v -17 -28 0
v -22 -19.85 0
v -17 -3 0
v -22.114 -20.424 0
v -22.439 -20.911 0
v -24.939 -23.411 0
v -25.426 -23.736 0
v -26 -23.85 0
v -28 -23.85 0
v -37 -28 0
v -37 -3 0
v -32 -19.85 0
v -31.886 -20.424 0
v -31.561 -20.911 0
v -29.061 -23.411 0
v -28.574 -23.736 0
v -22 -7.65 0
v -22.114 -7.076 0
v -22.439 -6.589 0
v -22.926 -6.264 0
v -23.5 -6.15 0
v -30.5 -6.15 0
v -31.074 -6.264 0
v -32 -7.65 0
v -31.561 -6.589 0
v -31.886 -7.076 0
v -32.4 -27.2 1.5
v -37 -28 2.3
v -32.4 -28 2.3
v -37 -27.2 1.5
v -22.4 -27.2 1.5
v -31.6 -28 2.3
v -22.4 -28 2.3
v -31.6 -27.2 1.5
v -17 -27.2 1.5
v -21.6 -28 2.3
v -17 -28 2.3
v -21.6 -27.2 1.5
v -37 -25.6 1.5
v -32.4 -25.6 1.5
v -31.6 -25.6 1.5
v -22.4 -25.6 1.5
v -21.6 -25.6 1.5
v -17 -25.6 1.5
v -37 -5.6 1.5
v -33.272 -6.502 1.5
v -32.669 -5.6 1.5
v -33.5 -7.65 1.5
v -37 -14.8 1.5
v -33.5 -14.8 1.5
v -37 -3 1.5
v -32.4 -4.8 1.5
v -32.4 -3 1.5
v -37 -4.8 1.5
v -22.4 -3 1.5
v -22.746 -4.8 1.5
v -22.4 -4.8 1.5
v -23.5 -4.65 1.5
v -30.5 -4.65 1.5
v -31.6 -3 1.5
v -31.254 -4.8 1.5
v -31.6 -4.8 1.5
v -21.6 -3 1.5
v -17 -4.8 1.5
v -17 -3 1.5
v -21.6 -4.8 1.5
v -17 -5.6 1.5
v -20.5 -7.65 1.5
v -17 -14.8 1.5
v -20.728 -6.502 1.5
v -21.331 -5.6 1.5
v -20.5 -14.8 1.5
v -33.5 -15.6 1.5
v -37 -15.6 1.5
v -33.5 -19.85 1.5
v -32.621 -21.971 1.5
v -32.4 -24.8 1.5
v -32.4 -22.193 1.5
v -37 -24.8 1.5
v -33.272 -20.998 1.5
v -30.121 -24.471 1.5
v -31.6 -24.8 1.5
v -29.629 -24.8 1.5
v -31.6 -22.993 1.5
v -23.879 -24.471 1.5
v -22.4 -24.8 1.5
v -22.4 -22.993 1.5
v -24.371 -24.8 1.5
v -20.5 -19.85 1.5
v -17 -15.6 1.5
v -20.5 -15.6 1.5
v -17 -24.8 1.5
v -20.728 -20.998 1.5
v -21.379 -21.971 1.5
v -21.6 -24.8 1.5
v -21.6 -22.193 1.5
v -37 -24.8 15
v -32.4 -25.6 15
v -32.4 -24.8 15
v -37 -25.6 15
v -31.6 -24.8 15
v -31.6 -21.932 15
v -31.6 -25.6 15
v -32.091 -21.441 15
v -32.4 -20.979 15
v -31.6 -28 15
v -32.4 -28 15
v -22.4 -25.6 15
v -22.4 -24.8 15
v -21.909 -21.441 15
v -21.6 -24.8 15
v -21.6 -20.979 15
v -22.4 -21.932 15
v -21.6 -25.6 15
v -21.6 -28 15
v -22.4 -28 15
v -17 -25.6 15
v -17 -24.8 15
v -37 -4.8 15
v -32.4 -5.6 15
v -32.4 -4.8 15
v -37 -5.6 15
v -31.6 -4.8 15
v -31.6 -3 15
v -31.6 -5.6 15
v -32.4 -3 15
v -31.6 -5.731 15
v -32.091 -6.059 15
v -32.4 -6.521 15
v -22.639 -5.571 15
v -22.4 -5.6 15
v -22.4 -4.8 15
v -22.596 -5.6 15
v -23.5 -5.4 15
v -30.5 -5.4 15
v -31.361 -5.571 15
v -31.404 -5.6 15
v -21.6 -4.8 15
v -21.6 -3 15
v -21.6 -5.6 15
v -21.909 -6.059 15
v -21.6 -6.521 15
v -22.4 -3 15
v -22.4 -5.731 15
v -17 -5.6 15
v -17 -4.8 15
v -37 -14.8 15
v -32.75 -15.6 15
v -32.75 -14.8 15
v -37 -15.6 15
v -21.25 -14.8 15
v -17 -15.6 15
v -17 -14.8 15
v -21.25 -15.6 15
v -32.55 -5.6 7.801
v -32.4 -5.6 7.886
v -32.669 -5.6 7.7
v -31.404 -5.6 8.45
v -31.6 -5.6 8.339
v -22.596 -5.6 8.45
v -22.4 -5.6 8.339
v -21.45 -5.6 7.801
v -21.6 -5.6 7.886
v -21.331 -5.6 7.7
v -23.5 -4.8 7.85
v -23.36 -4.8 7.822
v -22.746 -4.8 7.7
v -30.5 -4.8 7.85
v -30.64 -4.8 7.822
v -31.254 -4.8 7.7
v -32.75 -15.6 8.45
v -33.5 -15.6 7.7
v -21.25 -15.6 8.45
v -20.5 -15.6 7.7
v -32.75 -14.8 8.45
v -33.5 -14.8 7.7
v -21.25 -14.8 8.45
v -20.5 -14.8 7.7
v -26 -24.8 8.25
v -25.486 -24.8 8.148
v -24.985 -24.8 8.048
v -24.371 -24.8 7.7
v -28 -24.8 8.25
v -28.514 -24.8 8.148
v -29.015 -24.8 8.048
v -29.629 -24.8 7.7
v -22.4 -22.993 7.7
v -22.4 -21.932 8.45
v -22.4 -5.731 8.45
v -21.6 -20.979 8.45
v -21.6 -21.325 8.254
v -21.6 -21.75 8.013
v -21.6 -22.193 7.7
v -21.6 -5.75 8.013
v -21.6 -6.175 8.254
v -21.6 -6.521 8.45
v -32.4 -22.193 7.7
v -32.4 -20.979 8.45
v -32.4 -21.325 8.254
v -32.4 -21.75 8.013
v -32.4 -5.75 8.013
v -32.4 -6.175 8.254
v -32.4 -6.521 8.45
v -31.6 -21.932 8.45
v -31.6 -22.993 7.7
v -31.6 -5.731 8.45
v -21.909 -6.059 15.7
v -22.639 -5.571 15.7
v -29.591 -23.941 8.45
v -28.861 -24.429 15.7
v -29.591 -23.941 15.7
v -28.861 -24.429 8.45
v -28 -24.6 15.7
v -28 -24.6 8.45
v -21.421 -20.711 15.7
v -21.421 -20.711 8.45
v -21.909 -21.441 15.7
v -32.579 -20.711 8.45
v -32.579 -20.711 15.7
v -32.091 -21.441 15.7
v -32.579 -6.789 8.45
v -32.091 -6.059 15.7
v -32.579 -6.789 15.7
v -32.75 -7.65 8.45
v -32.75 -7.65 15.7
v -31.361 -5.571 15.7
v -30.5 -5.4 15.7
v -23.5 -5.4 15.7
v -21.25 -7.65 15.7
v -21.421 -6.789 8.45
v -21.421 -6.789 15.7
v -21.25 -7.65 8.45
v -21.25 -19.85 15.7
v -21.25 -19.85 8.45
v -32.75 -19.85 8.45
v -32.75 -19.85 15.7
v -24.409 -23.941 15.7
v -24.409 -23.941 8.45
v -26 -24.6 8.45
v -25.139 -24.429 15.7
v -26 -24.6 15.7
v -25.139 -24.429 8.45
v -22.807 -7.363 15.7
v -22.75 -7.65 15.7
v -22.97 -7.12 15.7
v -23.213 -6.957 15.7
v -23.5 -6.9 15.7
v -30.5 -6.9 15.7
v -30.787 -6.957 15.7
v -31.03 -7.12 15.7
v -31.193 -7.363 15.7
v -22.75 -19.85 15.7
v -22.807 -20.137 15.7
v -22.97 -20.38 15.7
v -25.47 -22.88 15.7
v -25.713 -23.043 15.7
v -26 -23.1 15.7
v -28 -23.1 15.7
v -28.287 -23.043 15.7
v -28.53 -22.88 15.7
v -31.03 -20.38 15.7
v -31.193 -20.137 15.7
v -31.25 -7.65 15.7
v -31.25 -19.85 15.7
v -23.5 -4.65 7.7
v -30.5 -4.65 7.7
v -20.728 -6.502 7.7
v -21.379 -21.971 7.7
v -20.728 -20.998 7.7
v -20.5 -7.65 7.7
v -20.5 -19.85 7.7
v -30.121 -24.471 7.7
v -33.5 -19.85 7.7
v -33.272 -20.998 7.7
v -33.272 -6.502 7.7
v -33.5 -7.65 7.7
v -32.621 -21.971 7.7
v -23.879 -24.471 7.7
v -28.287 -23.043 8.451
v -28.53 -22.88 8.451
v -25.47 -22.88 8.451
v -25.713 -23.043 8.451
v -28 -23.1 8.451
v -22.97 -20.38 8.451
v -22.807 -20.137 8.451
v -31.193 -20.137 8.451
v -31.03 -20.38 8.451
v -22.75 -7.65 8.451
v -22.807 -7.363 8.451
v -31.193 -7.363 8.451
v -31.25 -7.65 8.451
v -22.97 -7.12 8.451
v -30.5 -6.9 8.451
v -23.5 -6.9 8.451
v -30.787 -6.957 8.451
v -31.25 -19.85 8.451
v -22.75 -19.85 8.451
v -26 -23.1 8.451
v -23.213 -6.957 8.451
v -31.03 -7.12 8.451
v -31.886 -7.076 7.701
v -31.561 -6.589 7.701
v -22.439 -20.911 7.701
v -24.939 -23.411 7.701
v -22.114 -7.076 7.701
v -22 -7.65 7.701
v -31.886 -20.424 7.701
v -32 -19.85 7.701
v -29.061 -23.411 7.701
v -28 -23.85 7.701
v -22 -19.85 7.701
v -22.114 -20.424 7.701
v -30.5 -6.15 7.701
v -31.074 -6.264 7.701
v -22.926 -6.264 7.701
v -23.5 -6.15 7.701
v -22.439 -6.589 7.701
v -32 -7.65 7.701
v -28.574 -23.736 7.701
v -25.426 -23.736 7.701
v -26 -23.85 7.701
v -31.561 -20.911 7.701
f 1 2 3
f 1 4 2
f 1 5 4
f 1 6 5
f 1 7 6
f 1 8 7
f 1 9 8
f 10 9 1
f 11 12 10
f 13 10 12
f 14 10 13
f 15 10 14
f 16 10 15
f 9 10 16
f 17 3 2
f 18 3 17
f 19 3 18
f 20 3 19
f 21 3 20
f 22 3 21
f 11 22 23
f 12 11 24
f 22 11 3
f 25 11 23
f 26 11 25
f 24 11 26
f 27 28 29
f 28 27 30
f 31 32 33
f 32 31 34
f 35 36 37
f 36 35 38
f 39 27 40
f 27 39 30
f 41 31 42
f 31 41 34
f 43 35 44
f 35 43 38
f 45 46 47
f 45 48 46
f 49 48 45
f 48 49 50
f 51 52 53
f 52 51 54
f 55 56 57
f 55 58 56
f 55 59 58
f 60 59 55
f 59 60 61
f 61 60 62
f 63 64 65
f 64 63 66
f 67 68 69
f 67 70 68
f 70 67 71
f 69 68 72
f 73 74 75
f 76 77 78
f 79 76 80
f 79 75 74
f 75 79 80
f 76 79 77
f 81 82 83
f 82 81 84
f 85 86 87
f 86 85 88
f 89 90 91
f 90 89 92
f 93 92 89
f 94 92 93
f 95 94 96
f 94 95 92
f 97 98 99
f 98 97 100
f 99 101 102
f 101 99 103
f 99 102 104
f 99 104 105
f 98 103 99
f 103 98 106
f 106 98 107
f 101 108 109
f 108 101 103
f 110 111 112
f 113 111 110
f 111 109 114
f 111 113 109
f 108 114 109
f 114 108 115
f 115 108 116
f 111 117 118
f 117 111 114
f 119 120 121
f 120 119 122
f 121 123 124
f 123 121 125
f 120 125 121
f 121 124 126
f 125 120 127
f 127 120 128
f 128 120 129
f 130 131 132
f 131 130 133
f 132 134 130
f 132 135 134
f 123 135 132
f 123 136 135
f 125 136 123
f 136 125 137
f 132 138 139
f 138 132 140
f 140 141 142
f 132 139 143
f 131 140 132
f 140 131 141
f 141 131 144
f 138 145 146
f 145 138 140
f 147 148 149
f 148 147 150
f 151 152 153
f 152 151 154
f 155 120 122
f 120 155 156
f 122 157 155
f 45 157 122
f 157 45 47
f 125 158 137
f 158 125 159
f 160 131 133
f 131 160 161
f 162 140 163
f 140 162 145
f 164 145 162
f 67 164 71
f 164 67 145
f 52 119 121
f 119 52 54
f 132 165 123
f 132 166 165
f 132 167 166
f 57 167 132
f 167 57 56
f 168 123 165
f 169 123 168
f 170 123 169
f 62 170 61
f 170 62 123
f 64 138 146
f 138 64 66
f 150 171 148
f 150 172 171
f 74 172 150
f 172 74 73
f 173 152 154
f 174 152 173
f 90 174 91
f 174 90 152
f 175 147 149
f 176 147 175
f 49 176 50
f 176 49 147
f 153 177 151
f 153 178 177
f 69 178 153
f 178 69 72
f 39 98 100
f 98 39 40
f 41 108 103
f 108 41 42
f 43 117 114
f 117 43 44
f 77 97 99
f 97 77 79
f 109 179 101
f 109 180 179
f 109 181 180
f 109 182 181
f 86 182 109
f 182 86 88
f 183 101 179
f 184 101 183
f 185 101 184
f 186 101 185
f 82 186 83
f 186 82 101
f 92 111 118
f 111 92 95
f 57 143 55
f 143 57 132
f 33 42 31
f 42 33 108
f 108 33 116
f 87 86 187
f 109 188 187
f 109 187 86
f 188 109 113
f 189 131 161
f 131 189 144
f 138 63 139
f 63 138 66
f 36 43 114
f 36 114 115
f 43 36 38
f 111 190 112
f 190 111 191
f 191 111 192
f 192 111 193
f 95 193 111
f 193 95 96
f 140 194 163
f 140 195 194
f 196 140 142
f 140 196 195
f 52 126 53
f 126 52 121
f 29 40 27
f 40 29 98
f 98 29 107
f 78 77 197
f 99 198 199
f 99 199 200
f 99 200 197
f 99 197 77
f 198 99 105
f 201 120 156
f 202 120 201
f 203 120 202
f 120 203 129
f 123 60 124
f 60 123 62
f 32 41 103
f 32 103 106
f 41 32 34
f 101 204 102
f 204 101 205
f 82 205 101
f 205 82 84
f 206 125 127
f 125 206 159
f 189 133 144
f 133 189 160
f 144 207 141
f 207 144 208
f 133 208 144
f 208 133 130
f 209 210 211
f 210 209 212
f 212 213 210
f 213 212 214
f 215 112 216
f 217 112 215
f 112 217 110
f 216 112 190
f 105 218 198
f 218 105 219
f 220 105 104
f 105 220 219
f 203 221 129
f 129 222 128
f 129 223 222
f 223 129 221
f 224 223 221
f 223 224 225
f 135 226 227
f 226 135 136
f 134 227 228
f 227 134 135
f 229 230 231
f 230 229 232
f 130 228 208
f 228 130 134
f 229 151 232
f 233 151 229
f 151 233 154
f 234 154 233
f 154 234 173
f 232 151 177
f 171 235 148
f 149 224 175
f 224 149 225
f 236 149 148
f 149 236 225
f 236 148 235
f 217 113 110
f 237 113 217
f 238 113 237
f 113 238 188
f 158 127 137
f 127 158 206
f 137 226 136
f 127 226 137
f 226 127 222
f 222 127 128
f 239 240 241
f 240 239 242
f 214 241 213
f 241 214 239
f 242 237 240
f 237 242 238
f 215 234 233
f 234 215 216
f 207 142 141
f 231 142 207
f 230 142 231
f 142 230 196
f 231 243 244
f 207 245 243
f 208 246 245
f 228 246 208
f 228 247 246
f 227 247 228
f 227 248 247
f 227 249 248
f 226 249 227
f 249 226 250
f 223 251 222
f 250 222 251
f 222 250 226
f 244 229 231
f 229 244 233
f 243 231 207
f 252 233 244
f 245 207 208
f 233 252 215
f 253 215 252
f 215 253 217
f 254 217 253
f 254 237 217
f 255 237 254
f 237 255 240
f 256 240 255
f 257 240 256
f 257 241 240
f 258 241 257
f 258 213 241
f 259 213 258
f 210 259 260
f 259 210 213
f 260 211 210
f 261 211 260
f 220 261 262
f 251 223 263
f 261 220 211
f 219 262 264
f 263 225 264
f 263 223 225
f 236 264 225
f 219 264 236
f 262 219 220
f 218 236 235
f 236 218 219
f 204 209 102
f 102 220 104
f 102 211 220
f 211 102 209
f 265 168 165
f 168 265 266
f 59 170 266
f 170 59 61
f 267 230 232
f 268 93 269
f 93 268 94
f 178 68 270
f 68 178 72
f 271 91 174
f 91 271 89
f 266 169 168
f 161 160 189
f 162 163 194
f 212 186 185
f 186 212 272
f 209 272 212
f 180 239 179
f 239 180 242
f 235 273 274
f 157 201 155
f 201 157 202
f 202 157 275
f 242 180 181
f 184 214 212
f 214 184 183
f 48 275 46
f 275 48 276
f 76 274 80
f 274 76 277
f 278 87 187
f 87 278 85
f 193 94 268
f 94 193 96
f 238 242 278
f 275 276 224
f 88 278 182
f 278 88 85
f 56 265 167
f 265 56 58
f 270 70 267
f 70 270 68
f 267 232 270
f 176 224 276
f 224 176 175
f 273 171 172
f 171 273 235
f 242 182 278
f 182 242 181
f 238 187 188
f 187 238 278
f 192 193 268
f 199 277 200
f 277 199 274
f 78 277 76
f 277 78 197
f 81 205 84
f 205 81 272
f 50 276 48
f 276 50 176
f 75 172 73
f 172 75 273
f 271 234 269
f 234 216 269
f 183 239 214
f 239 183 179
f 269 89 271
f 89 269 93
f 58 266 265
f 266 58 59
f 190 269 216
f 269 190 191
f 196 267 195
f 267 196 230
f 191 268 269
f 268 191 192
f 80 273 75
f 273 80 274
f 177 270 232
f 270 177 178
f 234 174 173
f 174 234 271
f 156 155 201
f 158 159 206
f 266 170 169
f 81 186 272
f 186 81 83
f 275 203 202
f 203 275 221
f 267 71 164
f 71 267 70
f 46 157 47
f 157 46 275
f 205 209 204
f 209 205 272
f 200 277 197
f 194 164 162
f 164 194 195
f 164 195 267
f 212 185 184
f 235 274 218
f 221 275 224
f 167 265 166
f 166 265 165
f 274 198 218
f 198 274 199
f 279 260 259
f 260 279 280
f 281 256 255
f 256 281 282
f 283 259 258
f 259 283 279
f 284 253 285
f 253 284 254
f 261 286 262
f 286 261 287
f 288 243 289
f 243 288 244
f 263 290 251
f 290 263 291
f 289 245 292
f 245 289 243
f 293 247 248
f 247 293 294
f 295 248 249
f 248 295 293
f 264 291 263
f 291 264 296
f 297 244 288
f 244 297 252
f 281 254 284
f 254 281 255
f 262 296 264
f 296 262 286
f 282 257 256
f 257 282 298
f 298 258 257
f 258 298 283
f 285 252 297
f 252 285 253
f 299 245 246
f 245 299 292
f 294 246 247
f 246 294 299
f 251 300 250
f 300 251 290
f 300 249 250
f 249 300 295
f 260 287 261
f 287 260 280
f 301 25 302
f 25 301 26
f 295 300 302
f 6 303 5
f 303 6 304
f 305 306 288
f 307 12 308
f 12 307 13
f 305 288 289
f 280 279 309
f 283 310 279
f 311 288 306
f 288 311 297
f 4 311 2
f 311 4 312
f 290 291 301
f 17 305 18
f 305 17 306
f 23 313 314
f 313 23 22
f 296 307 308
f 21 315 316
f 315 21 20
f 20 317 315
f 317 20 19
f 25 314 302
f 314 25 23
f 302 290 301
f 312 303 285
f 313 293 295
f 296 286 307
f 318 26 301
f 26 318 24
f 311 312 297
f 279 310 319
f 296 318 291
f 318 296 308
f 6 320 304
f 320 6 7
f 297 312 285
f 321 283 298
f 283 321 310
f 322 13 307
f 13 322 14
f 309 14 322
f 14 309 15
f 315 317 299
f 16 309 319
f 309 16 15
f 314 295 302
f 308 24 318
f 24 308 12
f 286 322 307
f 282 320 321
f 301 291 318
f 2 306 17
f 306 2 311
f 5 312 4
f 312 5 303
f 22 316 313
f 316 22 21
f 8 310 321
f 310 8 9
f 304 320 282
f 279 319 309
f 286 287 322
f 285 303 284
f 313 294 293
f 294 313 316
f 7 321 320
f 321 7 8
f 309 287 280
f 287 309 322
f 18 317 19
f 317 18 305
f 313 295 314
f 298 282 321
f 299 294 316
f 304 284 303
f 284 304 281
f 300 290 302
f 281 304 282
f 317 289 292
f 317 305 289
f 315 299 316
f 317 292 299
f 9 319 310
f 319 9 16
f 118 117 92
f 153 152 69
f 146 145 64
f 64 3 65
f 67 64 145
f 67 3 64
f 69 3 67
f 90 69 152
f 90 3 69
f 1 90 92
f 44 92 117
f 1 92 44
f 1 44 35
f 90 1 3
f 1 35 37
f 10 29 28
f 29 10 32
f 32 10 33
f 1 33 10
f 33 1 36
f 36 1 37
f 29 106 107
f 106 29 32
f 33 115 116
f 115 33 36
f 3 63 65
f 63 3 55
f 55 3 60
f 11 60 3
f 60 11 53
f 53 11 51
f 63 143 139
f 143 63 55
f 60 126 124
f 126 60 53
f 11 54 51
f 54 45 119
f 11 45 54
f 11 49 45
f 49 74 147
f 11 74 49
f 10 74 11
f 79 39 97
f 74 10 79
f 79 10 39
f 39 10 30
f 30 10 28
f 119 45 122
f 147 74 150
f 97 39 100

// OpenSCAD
// file: params.scad
depth=40;

xt60_loc = [ [-47,-depth, 15], [-27,-depth, 15], [-7,-depth, 15] ];
plug_loc = [5,-depth, 1.5];

margin = 0.2;

plug_margin=0.2;

xt60_margin = 0.25;
xt60m_margin = 1;

xt60_thickness = 1.5;
plug_thickness = 2;

case_w_inner = 115+2*margin;
case_h_inner = 30+2*margin;
case_thickness = 3;
case_front_thickness = 1.5;
case_w = case_w_inner + 2*case_thickness;
case_d = depth + 40;
case_h = case_h_inner + 2*case_thickness;

case_dim = [case_w, case_d, case_h];
case_dim_inner = [case_w_inner, case_d, case_h_inner];
case_dim_inside = [(case_w_inner+case_w)/2, case_d, (case_h_inner+case_h)/2];

bump_corner=(case_thickness+margin)*2.5;

front = [0,-1, 0];
bottom_front = [0,-1,-1];

grid_rows = 3;
grid_cols = 11;
grid_pitch = 10;
grid_thickness = .8;
grid_depth=12;
grid_xoff =-2;

screw_thread=3;
screw_hole_r=(screw_thread*.9)/2;
screw_hole_border=2;

mw_lrs_gap_d = 18.5;
// file: power_shield.scad
use <utils.scad>
use <grid.scad>

use <mw_lrs.scad>
use <powerplug.scad>
use <xt.scad>

$fn=16;
e=.001;


margin=.15;
shield_thickness=1.;
shield_bottom=.6;

border_w=51;
border_h=31.2;
border_d=3.5;

w=47;
h=26.8;
d=22;
chamf=4;

corner=1;

module plug_keepout(margin=0, depth=39, e=0)
{
	$fn=16;

	d = .1+e;
	border_w = border_w-2*corner;
	border_h = border_h-2*corner;
	w = w-2*corner;
	h = h-2*corner;
	r = corner+margin;
	off = 16.5;

	color([.3,.3,.3])
	translate([corner,depth-.1,corner])
	rotate([90,0,0])
	{
		translate([(border_w-w)/2,0,-d])
		linear_extrude(d+e)
		hull()
		for (p=[ [off, 0],
		         [off, h],
		         [w-chamf, h],
		         [w, h-chamf],
		         [w, chamf],
		         [w- chamf, 0],
		])
		translate(p)
		circle(r);
	}
}

module plug_hull(margin, d, e=0)
{
	hull()
	{
		difference()
		{
		plug(margin=margin, extra_depth=5+shield_bottom);
		translate([-10,-10,-10])
		cube([100, 30, 100]);
		}
		plug_keepout(margin=margin, depth=d, e=0);
	}
	plug_keepout(margin=margin, depth=d, e=e);
	
}

inner_w=.8;

module power_shield()
{
color("red")
	union()
	{
	difference()
	{
		union()
		{
			plug_hull(margin=margin+shield_thickness, d=39);
		}
		union()
		{
		plug_hull(margin=margin, d=38, e=2);
		}
	}

	intersection()
	{
		plug_hull(margin=margin+shield_thickness/2, d=38.5, e=2);
		difference()
		{
			union()
			{
				translate([(border_w-w)/2+8.5-inner_w/2, 22, h/2-4-inner_w/2])
				cube([inner_w, 20, 20]);

				translate([(border_w-w)/2+8.5, 22, h/2-4-inner_w/2])
				cube([9., 17, inner_w]);

				translate([(border_w-w)/2+17.5-inner_w/2, 22, h/2-4-inner_w/2])
				cube([inner_w, 17, 10]);

				translate([(border_w-w)/2+15-inner_w/2, 38.4, h/2-4-inner_w/2])
				cube([2.5, shield_bottom, 10]);

				for (y=[0,h])
				for (x=[0,w-2])
				translate([(border_w-w)/2+x-5/sqrt(2)-inner_w/2, 22, y])
				rotate([0,45,0])
				cube([5,1,5]);

			}
			translate([(border_w-w)/2+6.5-inner_w/2, 21, h/2-6/2-inner_w/2])
			cube([5, 2, 5.5]);
		}
	}
}
}

rotate([-90,0,0])
translate([0,-39,0])
{
	power_shield();

	//preview()
	//plug();
}
// file: powerplug.scad
e=0.001;

border_w=51;
border_h=31.2;
border_d=3.5;

w=47;
h=26.8;
d=22;
chamf=4;

corner=1;

module plug(margin=0, extra_depth=0)
{
	$fn=16;

	d = d+extra_depth;
	border_w = border_w-2*corner;
	border_h = border_h-2*corner;
	w = w-2*corner;
	h = h-2*corner;
	r = corner+margin;

	color([.3,.3,.3])
	translate([corner,0,corner])
	rotate([90,0,0])
	{
		translate([0,(h-border_h)/2,0])
		linear_extrude(border_d+margin)
		hull()
		for(p=[ [0, 0],
		        [0, border_h],
		        [border_w, border_h],
		        [border_w, 0]
		])
		translate(p)
		circle(r);

		translate([(border_w-w)/2,0,-d])
		linear_extrude(d+e)
		hull()
		for (p=[ [0, 0],
		         [0, h],
		         [w-chamf, h],
		         [w, h-chamf],
		         [w, chamf],
		         [w- chamf, 0],
		])
		translate(p)
		circle(r);
	}
}

module plug_latch(margin=0)
{
	rotate([90,0,0])
	rotate([0,90,0])
	linear_extrude(9)
	{
		polygon([ [0, -1], [0, 1+margin], [9, margin]]);
	}
}

module plug_latches(margin=0)
{
	for (x=[9.5,32])
	for (y_flip=[-1, 1])
	translate([(border_w-w)/2+x,1.6, h/2])
	scale([1,1,y_flip])
	translate([0,0,h/2])
	plug_latch(margin);
}


module plug_latches_keepout(margin=0, extra_depth=0)
{
	for (x=[9.5,32])
	for (y_flip=[-1, 1])
	translate([(border_w-w)/2+x,1.6, h/2])
	scale([1,1,y_flip])
	translate([0,0,h/2])
	cube([9,d+extra_depth-1.6+e,1+margin]);
}

plug();

plug_latches();

#plug_latches_keepout();

%plug(margin=.3);
// file: mw_lrs.scad
e=.001;
$fn=16;

mw_lrs_w=115;
mw_lrs_h=30;
mw_lrs_d=215;


mw_lrs_holes_pitch_d  = 150;
mw_lrs_holes_pitch_w  = 50;
mw_lrs_holes_height_h = 12.5;

mw_lrs_gap_h = 23;
mw_lrs_gap_d = 18.5;

mw_lrs_case_thickness = 1.6;

m4_thread = 4;

mw_lrs_screw_terminal_x=8.5;
mw_lrs_screw_terminal_w=88;
mw_lrs_screw_terminal_d=15;
mw_lrs_screw_terminal_h=15;
mw_lrs_screw_terminal_pitch = 9.5;
mw_lrs_screw_terminal_gap_w = 8;
mw_lrs_screw_terminal_gap_d = 14;
mw_lrs_screw_terminal_gap_z = 7;
mw_lrs_screw_terminal_gap_h = 6;

module mw_lrs_side_holes()
{
	translate( [0, 0, mw_lrs_holes_height_h] )
	for( r = [ 0, 180 ] )
	rotate( [0, r, 0] )
	for( y = [ (mw_lrs_d-mw_lrs_holes_pitch_d)/2, (mw_lrs_d+mw_lrs_holes_pitch_d)/2 ] )
	translate( [-mw_lrs_w/2, y, 0] )
	rotate( [0, 90, 0] )
	children();
}

module mw_lrs_bottom_holes()
{
	for( x = [ -mw_lrs_holes_pitch_w/2, mw_lrs_holes_pitch_w/2 ] )
	for( y = [ (mw_lrs_d-mw_lrs_holes_pitch_d)/2, (mw_lrs_d+mw_lrs_holes_pitch_d)/2 ] )
	translate( [x, y, 0] )
	children();
}

module mw_lrs_holes()
{
	mw_lrs_side_holes() children();
	mw_lrs_bottom_holes() children();
}

module mw_lrs_screw_terminal()
{
	colors = [
		"red", "red", "red",
		"black", "black", "black",
		"green", "blue", "brown",
	];
	b=1;
	translate([mw_lrs_screw_terminal_x, mw_lrs_case_thickness, mw_lrs_h-mw_lrs_gap_h-e])
	{
		difference()
		{
			translate([-mw_lrs_screw_terminal_w/2, 0, 0])
			cube([mw_lrs_screw_terminal_w, mw_lrs_screw_terminal_d, mw_lrs_screw_terminal_h+e]);
			for (i=[0:8])
			translate([(i-4)*9.5-mw_lrs_screw_terminal_gap_w/2, -b, mw_lrs_screw_terminal_gap_z])
			cube([mw_lrs_screw_terminal_gap_w, mw_lrs_screw_terminal_gap_d+b, mw_lrs_screw_terminal_gap_h]);
		}

		for (i=[0:8])
		translate([(i-4)*9.5-mw_lrs_screw_terminal_gap_w/2, -0, mw_lrs_screw_terminal_h])
		color(colors[i])
		cube([mw_lrs_screw_terminal_gap_w,mw_lrs_screw_terminal_gap_d,.1]);

	}
}

module mw_lrs_vents()
{
	b=1;
	hole=4;
	for (y = [36, 44, 52])
	for (i = [-1, 1])
	hull()
	{
		translate([i*(19/2+hole/2), y, mw_lrs_h-mw_lrs_case_thickness-b])
			cylinder(mw_lrs_case_thickness+2*b, r=hole/2);

		translate([i*(19/2+hole/2+33), y, mw_lrs_h-mw_lrs_case_thickness-b])
			cylinder(mw_lrs_case_thickness+2*b, r=hole/2);
	}

	translate([-mw_lrs_w/2+36.7, mw_lrs_d-47.45,mw_lrs_h-mw_lrs_case_thickness-b])
		cylinder(mw_lrs_case_thickness+2*b, r=50/2);
}

module mw_lrs_vents_keepout(h, margin=0)
{
	b=1;
	hole=4;
	hull()
	for (y = [36, 44, 52])
	for (i = [-1, 1])
	{
		translate([i*(19/2+hole/2), y, mw_lrs_h-b])
			cylinder(h+b, r=hole/2+margin);

		translate([i*(19/2+hole/2+33), y, mw_lrs_h-b])
			cylinder(h+b, r=hole/2+margin);
	}

	translate([-mw_lrs_w/2+36.7, mw_lrs_d-47.45,mw_lrs_h-b])
		cylinder(h+b, r=50/2);
}

module mw_lrs()
{
	b=1; 

	union()
	{
		color([.75,.75,.75])
		difference()
		{

			translate([-mw_lrs_w/2,0,0])
			cube([mw_lrs_w, mw_lrs_d, mw_lrs_h]);

			union()
			{
				translate([-mw_lrs_w/2+mw_lrs_case_thickness, -b, mw_lrs_h-mw_lrs_gap_h] )
				cube( [ mw_lrs_w-2*mw_lrs_case_thickness, b+mw_lrs_gap_d, mw_lrs_gap_h+b] );

				translate([-mw_lrs_w/2+mw_lrs_case_thickness, mw_lrs_gap_d-e, mw_lrs_h-mw_lrs_gap_h] )
				cube( [ mw_lrs_w-2*mw_lrs_case_thickness, mw_lrs_d-mw_lrs_gap_d+e-mw_lrs_case_thickness, mw_lrs_gap_h-mw_lrs_case_thickness] );

				mw_lrs_vents();

				mw_lrs_holes()
				{
					translate([0,0,-e])
					cylinder(h=5+e, r=m4_thread/2);
				}
			}
		}
		color([.1, .3, .1])
		translate([-mw_lrs_w/2+mw_lrs_case_thickness, 0, mw_lrs_h-mw_lrs_gap_h-e])
		cube([mw_lrs_w-2*mw_lrs_case_thickness, mw_lrs_d-mw_lrs_case_thickness, e+.1]);
		mw_lrs_screw_terminal();
	}
}

module mw_lrs_keepout(margin=0, e=0)
{
	b=1; 

	w=mw_lrs_w+margin*2;
	d=mw_lrs_d+margin*2;
	h=mw_lrs_h+margin*2;

	translate([-w/2,-margin,-margin])
	cube([w, d, h]);
}

mw_lrs();
%mw_lrs_keepout(margin=.4);

module m4_hole(h, margin=0)
{
	translate([0,0,-h])
	cylinder(h=h+e, r=(m4_thread+margin)/2);
}

%mw_lrs_holes()
m4_hole(10);
// file: grid.scad
module bars(width, height, n, pitch, bar_width, off)
{
	for (i=[0:n-1])
		translate([0, (i-(n-1)/2)*pitch-bar_width/2+off, 0])
			cube([width, bar_width, height]);
}

module grid(width, depth, height, n_rows, n_cols, pitch=10, x_pitch=-1, y_pitch=-1, bar_width=1, x_bar_width=-1, y_bar_width=-1, x_off=0, y_off=0)
{
	x_pitch = x_pitch > 0 ? x_pitch : pitch;
	y_pitch = y_pitch > 0 ? y_pitch : pitch;
	x_bar_width = x_bar_width > 0 ? x_bar_width : bar_width;
	y_bar_width = y_bar_width > 0 ? y_bar_width : bar_width;

	translate( [0, depth/2, 0] )
		bars( width, height, n_rows, y_pitch, y_bar_width, y_off );
	translate( [width/2, 0, 0] )
		rotate([0,0,90])
			bars( depth, height, n_cols, x_pitch, x_bar_width, -x_off) ;
}

grid(100, 50, 1, 4, 8);
// file: cover.scad
use <utils.scad>
use <grid.scad>

use <mw_lrs.scad>
use <powerplug.scad>
use <power_shield.scad>
use <xt.scad>

include <params.scad>

$fn=16;
e=.001;

module cutout()
{
	mw_lrs_keepout(margin=margin);

	for ( p = xt60_loc )
	translate(p)
	translate([0,0,0])
	rotate([90,90,0])
	xt60f_cutout(margin=xt60_margin,m_margin=xt60m_margin,e=e);

	translate(plug_loc)
	{
	plug(margin=plug_margin, , extra_depth=-2);
	plug_latches_keepout(margin=plug_margin);
	}

	mw_lrs_holes()
	m4_hole(10, margin=.25);

	mw_lrs_vents_keepout(h=10, margin=1);
}

module shell()
{
	difference()
	{
		translate([0, -depth, -case_thickness-margin])
		rounded_block_y(case_dim, bottom_front, r=case_thickness);

		translate([0, -depth+case_front_thickness, -margin])
		chamfer_block([case_w_inner, case_d, case_h_inner], bottom_front, r=case_thickness);
	}
}

module round_corner(w)
{
	difference()
	{
		rotate([90,0,0])
		cylinder(w, r1=w, r2=0);
		union()
		{
			translate([-w-e,-w,-w])
			cube([w,w*2,w*2]);

			translate([-w,-w,-w-e])
			cube([w*2,w*2,w]);
		}
	}
}


module bump_corner(w)
{
	round_corner(w, $fn=4);
}

module front_grid()
{
	translate([0, -depth+e,-case_thickness/2])
	xz_toward_y()
	anchor(case_dim_inside, bottom_front)
	grid(case_dim_inside.x, case_dim_inside.z, case_thickness+grid_depth-e, grid_rows, grid_cols, pitch=grid_pitch, bar_width=grid_thickness, x_off=grid_xoff, y_off=0);
}

module at_panel_screws()
{
	for (x=[ -12, -42 ])
	for (z=[ 5, 25 ])
	translate([x,-depth, z])
	children();
}


module cover()
{
	difference()
	{
		union()
		{
			shell();
	
			intersection()
			{
				union()
				{
					front_grid();
					translate(plug_loc)
					plug(margin=plug_margin+plug_thickness, extra_depth=-2);
	
					for ( p = xt60_loc )
					translate(p)
					rotate([90,90,0])
					xt60f_shell_cutout(margin=  xt60_margin+xt60_thickness,
					                 m_margin=xt60m_margin+xt60_thickness);

					at_panel_screws()
					translate([0,-e, 0])
					xz_toward_y()
					linear_extrude(15.7+e)
					circle(screw_hole_r+screw_hole_border);

				}
				translate([0, -depth+e, case_h_inner/2])
				block(case_dim_inside, front);
			}

			translate([0,-margin,case_h_inner/2-margin])
			for (x=[1, -1])
			for (z=[1, -1])
			scale([x, 1, z])
			translate([-case_w_inner/2, 0,-case_h_inner/2])
			bump_corner(bump_corner);
		}
		union()
		{
			cutout();

			at_panel_screws()
			translate([0,case_thickness+e, 0])
			xz_toward_y()
			linear_extrude(15.7)
			circle(screw_hole_r);
		}
	}
}


module print_orientation()
{
	rotate([90,0,0])
	translate([0,depth,0])
	children();
}


print_orientation()
preview()
{
	mw_lrs();

	for ( p = xt60_loc )
	translate(p)
	rotate([90,90,0])
	xt60f();

	translate(plug_loc)
	plug();

	translate(plug_loc)
	power_shield();
}

print_orientation()
#cover();
// file: xt.scad
e=.001;
$fn=16;

xt60_w=15.7;
xt60_h=8;
xt60f_d = 15.7;
xt60f_base_d = 8;
xt60_combined_d=24.1;
xt60_pitch=7;
xt60_chamfer=2.5;
xt60f_pin_d=5.7;
xt60m_pin_d=4.7;
xt60_pin_w=4.5;
xt60_hole_w=4.5;
xt60_corner=.5;

module xt_pins(width, height, pitch)
{
	for (p=[-pitch/2, pitch/2])
	translate([p,0,0])
	cylinder(h=height, r=width/2);
}

module xt_base(w, h, d, chamfer, corner, margin=0, e=0)
{
	w = w-2*corner;
	h = h-2*corner;
	r = corner+margin;
	translate([0,0,-e])
    linear_extrude(d+2*e)
	hull()
    for (p=[ [w/2,-h/2],
	         [-w/2+chamfer, -h/2],
	         [-w/2, -h/2+chamfer],
	         [-w/2, h/2-chamfer],
	         [-w/2+chamfer, h/2],
	         [w/2, h/2]
	])
	translate(p)
	circle(r);
}

module xt60_combined_shell_cutout(margin=0,f_margin=-1,m_margin=-1, e=0)
{
	b=1; 
	xt_base(xt60_w, xt60_h, xt60_combined_d, xt60_chamfer, xt60_corner, margin, e);
	if (f_margin > margin)
	hull()
	{
		xt_base(xt60_w, xt60_h, xt60f_base_d, xt60_chamfer, xt60_corner, f_margin, e);
		translate([0,0,xt60f_base_d])
		xt_base(xt60_w, xt60_h, f_margin-margin, xt60_chamfer, xt60_corner, margin, e);
	}
	if (m_margin > margin)
	hull()
	{
		translate([0,0,xt60f_base_d-(m_margin-margin)])
		xt_base(xt60_w, xt60_h, m_margin-margin, xt60_chamfer, xt60_corner, margin, e);
		translate([0,0,xt60f_base_d])
		xt_base(xt60_w, xt60_h, xt60_combined_d-xt60f_base_d, xt60_chamfer, xt60_corner, m_margin, e);
	}
}


module xt60_combined_cutout(margin=0,f_margin=-1,m_margin=-1, e=0)
{
	b=1; 
	xt60_combined_shell_cutout(margin,f_margin,m_margin, e);

	translate([0, 0, -xt60f_pin_d-margin])
	xt_pins(xt60_pin_w+margin*2, xt60f_pin_d+b+margin, xt60_pitch);

	translate([0, 0, xt60_combined_d-b])
	xt_pins(xt60_pin_w+margin*2, xt60m_pin_d+b+margin, xt60_pitch);
}

module xt60f_cutout(margin=0,f_margin=-1,m_margin=-1,e=0)
{
	translate([0,0,-xt60f_d])
	xt60_combined_cutout(margin,f_margin,m_margin,e);
}

module xt60f_shell_cutout(margin=0,f_margin=-1,m_margin=-1,e=0)
{
	translate([0,0,-xt60f_d])
	xt60_combined_shell_cutout(margin,f_margin,m_margin,e);
}

module xt60f()
{
	b=1;
	translate([0,0,-xt60f_d])
	{
		xt_base(xt60_w, xt60_h, xt60f_base_d, xt60_chamfer, xt60_corner, 0, e);

		translate([0,0,b])
		difference()
		{
			xt_base(xt60_w-2*xt60_corner, xt60_h-2*xt60_corner, xt60f_d-b, xt60_chamfer, xt60_corner, 0, e);
			xt_pins(xt60_hole_w, xt60f_d, xt60_pitch);

		}

		difference()
		{
			translate([0, 0, -xt60f_pin_d])
			xt_pins(xt60_pin_w, xt60f_pin_d+b, xt60_pitch);

			translate([0, 0, -xt60f_pin_d-b])
			xt_pins(xt60_pin_w*.8, xt60f_pin_d+b, xt60_pitch);
		}
	}
}

xt60f();
%xt60f_cutout(margin=.4,m_margin=1,e=e);
// file: utils.scad
module xz_toward_y()
{
	scale([1, 1, -1])
	rotate([-90,0,0])
	children();
}

module anchor(dim, anchor=[0,0,0])
{
	translate([-(1+anchor.x)*dim.x/2, -(1+anchor.y)*dim.y/2, -(1+anchor.z)*dim.z/2])
	children();
}

module block(dim, anchor=[0,0,0])
{
	anchor(dim, anchor)
	cube(dim);
}

module rounded_block_y(dim, anchor=[0,0,0], r=0)
{
	anchor(dim, anchor)
	xz_toward_y()
	linear_extrude(dim.y)
	hull()
	for (p=[ [r,r], [dim.x-r, r], [dim.x-r, dim.z-r], [r, dim.z-r] ] )
	translate(p)
	circle(r);
}

module chamfer_block_y(dim, anchor=[0,0,0], r=0)
{
	anchor(dim, anchor)
	hull()
	{
		translate([r,0,0])
		cube([dim.x-r*2, dim.y, dim.z]);

		translate([0,0,r])
		cube([dim.x, dim.y, dim.z-r*2]);
	}
}

module chamfer_block(dim, anchor=[0,0,0], r=0)
{
	anchor(dim, anchor)
	hull()
	{
		translate([r,r,0])
		cube([dim.x-r*2, dim.y-r*2, dim.z]);

		translate([r,0,r])
		cube([dim.x-r*2, dim.y, dim.z-r*2]);

		translate([0,r,r])
		cube([dim.x, dim.y-r*2, dim.z-r*2]);
	}
}

module preview()
{
	if ($preview)
	children();
}
// main file
use <utils.scad>
use <xt.scad>
use <cover.scad>

print_orientation()
preview()
{
        translate( [-27,-40, 15])
        rotate([90,90,0])
        xt60f();
}

print_orientation()
#intersection()
{
cover();
translate([-37,-41,3])
cube([20,50,25]);
}
